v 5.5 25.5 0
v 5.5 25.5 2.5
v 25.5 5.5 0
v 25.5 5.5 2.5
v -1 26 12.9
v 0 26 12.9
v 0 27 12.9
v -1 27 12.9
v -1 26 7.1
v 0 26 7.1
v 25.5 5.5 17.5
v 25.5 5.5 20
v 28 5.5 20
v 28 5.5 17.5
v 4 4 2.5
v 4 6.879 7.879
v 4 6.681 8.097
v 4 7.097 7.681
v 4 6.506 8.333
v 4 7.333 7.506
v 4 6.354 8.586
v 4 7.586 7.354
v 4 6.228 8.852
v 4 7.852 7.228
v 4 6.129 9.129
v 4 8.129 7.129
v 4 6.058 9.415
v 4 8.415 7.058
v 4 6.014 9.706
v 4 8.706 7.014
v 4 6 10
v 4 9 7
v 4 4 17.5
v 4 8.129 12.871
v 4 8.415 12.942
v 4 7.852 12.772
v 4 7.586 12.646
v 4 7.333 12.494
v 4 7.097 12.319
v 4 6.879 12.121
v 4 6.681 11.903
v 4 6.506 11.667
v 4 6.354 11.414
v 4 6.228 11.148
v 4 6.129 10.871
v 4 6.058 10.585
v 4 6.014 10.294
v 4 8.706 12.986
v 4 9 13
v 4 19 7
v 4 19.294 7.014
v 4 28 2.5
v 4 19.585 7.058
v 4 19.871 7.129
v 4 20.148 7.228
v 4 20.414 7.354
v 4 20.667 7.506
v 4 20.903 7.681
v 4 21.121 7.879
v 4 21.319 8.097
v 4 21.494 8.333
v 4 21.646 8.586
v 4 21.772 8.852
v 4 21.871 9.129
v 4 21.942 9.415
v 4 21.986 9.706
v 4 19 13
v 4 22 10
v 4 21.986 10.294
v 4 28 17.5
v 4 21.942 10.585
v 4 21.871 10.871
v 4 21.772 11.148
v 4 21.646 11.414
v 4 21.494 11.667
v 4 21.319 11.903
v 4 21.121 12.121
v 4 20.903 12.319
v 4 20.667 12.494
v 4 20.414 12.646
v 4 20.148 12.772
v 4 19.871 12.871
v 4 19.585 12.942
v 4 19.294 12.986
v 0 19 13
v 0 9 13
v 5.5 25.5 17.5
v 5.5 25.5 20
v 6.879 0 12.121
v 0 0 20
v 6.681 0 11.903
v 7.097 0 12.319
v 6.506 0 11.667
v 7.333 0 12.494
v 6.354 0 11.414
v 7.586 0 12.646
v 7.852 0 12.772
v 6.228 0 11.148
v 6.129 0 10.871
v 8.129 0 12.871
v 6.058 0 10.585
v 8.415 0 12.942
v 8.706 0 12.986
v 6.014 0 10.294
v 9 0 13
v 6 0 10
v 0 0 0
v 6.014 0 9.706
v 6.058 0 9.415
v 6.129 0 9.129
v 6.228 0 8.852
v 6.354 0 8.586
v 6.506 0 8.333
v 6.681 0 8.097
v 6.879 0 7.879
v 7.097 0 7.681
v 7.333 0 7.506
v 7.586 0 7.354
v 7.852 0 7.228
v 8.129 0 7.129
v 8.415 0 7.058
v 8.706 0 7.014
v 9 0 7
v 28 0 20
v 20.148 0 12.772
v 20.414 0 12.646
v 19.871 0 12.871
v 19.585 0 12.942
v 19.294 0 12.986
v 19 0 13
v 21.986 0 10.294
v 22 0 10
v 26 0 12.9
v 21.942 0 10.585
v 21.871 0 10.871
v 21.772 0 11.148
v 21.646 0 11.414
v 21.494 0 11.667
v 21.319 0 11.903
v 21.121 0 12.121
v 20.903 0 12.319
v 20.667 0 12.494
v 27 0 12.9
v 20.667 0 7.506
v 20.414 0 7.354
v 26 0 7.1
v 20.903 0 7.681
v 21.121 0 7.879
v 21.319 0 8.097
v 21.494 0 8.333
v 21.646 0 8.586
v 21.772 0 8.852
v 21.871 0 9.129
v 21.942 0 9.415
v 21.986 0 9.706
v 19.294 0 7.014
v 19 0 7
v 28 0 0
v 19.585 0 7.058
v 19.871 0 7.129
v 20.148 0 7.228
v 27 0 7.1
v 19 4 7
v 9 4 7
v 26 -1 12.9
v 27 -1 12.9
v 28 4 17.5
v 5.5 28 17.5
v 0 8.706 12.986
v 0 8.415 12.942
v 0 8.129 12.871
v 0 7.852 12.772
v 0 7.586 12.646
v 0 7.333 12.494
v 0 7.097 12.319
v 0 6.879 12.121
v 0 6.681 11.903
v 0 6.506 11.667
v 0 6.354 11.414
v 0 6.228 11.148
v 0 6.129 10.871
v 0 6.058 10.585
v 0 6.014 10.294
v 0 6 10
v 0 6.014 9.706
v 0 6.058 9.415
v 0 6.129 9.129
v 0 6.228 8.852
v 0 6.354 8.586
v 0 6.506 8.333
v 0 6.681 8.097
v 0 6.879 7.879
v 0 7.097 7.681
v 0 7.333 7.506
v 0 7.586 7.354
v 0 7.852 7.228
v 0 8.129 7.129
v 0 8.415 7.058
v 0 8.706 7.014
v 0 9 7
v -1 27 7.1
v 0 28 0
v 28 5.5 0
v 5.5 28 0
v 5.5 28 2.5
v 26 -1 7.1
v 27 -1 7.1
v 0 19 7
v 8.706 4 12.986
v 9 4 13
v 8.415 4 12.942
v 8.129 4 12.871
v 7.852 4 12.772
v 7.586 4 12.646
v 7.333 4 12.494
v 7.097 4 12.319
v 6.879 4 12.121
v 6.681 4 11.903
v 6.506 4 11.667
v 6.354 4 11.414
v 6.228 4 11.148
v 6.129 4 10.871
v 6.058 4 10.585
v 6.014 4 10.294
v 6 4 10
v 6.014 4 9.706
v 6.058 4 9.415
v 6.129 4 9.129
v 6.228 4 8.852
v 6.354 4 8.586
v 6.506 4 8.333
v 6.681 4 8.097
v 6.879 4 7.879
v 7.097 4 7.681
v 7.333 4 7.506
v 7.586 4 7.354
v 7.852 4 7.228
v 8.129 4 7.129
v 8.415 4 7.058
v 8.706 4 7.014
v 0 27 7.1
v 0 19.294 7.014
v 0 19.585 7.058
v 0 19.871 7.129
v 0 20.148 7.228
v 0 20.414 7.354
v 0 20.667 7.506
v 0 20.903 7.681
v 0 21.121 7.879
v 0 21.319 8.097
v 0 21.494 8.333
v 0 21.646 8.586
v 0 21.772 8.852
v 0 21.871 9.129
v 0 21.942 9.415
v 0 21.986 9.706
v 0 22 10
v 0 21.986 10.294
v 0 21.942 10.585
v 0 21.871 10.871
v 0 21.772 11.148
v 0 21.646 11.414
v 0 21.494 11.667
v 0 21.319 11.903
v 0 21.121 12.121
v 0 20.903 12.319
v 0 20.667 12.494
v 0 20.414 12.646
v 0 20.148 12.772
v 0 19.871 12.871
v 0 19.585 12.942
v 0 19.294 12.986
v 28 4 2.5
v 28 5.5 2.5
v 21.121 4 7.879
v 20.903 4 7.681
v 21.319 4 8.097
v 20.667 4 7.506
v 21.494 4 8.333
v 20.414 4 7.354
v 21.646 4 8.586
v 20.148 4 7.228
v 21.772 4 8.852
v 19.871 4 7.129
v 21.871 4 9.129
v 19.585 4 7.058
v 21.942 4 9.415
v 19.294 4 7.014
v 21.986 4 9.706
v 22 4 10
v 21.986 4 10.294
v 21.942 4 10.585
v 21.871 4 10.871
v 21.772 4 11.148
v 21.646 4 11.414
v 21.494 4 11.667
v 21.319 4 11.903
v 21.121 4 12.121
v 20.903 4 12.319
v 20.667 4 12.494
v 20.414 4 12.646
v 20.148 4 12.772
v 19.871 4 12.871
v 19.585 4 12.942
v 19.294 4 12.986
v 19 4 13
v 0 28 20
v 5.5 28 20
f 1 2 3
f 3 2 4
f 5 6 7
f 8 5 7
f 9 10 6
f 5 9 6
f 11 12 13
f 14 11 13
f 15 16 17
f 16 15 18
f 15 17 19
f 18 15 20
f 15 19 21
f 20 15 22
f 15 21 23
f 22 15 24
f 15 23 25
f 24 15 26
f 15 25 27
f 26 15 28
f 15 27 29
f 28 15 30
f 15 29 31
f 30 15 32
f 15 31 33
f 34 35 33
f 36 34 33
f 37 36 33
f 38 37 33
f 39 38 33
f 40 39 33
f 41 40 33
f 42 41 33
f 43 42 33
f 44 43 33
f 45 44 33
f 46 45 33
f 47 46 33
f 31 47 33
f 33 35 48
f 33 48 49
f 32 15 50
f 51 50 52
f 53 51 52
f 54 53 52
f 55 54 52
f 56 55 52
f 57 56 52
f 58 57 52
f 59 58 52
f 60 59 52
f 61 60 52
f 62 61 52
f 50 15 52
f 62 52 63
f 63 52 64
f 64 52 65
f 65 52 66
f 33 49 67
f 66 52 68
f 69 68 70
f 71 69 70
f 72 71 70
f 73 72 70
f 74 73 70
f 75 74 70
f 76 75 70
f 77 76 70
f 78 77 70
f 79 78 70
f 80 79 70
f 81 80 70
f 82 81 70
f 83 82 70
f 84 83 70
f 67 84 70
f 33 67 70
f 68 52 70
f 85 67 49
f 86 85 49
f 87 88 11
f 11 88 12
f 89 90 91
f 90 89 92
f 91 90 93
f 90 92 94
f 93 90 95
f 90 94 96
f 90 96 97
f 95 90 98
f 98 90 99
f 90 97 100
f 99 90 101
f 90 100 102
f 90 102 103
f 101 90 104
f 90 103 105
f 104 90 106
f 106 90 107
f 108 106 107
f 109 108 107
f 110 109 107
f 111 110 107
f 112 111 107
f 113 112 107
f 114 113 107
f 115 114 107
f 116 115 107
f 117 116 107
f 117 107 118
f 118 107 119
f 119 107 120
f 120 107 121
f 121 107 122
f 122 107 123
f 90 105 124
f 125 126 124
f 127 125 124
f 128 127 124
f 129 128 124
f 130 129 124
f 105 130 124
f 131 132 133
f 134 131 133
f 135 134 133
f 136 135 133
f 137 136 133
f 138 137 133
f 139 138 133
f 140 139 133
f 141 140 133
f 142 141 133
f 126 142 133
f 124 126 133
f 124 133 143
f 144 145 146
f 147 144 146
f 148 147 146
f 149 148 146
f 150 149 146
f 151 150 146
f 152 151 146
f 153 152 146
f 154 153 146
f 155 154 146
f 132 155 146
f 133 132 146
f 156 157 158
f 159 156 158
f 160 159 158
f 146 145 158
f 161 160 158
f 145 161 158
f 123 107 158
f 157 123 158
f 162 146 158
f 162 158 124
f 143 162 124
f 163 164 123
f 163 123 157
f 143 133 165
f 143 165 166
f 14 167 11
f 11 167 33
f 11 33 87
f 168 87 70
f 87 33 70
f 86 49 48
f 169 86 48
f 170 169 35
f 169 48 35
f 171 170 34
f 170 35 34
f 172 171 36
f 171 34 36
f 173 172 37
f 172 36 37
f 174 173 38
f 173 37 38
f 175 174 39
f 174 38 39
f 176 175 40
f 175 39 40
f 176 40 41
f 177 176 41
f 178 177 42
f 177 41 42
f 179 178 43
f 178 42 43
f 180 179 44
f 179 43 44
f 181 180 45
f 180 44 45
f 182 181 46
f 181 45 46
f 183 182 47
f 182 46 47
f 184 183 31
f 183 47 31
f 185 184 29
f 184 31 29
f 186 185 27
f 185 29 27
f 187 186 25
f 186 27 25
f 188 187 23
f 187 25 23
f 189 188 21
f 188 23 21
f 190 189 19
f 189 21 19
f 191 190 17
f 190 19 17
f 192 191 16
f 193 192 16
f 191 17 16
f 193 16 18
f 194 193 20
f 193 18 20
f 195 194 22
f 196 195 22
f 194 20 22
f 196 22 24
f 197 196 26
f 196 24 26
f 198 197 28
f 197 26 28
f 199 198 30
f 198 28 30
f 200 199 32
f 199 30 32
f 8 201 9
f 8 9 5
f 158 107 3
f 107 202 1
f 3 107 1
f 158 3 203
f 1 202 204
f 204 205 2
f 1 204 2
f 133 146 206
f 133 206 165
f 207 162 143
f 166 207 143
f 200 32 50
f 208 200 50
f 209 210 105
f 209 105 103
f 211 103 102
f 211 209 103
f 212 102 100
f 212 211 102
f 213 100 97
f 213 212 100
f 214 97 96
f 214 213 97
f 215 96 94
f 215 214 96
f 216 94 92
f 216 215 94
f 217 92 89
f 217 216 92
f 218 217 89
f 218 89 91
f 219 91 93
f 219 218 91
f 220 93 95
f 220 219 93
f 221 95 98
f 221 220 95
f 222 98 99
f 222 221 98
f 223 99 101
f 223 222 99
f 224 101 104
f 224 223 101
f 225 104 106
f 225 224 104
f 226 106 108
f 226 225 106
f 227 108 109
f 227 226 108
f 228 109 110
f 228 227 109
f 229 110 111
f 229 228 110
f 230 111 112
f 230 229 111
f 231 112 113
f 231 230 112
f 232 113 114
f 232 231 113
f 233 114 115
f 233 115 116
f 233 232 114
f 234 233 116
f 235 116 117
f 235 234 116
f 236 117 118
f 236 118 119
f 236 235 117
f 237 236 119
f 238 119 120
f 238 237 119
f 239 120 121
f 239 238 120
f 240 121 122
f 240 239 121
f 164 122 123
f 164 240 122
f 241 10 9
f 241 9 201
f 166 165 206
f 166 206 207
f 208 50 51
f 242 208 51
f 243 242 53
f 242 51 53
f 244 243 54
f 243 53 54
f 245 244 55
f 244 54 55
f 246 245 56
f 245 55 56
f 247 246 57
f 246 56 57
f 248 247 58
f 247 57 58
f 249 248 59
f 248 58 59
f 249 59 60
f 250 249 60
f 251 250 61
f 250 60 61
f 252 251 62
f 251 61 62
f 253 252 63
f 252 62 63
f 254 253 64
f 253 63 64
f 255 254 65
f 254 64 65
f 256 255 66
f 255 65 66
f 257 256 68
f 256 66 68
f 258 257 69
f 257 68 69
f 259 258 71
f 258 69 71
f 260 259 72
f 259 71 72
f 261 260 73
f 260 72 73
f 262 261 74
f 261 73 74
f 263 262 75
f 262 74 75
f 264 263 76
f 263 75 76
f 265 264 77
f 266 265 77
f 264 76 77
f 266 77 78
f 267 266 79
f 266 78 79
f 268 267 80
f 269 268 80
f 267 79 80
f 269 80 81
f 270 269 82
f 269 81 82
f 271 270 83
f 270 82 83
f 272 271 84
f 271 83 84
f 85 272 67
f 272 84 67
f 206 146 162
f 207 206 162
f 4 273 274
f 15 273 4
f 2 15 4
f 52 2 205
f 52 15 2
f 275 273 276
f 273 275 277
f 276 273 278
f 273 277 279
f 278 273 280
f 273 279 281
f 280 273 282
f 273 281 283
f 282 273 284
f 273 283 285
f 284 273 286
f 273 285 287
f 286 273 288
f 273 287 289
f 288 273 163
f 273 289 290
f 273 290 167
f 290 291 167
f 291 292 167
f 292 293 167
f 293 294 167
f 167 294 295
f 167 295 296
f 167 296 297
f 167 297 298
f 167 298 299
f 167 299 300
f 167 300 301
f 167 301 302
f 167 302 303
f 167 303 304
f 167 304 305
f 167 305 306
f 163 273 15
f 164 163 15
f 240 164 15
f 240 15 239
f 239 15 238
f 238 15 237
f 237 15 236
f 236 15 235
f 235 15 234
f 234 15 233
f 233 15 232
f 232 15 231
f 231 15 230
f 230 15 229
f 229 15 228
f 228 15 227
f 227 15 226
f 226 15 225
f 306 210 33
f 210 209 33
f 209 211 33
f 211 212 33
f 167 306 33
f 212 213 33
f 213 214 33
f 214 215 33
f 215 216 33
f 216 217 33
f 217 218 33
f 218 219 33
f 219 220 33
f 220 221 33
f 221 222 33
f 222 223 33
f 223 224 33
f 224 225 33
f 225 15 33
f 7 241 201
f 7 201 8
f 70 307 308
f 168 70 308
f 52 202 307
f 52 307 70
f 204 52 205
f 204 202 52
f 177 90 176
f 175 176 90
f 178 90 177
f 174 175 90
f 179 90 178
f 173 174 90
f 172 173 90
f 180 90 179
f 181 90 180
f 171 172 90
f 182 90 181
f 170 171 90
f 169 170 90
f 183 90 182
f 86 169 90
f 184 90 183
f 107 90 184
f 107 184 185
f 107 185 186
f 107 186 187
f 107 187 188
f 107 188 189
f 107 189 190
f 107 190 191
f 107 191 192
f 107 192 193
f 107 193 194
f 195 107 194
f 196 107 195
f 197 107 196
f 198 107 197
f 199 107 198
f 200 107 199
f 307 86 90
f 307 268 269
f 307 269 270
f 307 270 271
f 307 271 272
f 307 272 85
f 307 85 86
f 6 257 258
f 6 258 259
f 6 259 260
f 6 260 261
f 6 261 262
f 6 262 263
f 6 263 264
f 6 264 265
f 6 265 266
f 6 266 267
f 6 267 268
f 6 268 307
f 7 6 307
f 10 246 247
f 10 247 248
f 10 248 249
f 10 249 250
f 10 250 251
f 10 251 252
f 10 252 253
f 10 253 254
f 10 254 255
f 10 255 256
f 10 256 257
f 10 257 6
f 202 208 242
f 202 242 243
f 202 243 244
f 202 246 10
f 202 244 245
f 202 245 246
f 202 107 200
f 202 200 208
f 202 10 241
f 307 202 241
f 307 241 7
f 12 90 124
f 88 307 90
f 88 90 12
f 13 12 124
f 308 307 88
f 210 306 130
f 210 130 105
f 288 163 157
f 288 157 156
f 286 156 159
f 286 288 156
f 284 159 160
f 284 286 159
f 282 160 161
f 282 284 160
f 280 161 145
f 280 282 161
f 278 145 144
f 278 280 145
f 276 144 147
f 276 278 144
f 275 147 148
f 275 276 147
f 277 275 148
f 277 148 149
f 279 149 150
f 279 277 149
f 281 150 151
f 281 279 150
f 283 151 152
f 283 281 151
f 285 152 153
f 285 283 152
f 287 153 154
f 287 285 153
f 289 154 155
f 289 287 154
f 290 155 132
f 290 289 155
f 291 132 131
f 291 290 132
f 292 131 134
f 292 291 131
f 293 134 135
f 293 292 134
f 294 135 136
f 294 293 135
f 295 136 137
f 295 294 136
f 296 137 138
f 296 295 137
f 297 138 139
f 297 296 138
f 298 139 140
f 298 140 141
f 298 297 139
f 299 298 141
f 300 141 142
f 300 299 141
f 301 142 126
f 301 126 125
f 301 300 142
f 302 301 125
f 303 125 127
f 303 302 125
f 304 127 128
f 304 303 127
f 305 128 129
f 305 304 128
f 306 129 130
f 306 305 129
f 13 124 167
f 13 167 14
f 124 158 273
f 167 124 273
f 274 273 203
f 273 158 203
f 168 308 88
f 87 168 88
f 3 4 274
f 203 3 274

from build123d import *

# Parameters (mm, degrees)
SKETCH1_W           = 28
SKETCH1_H           = 28
BOSS_EXTRUDE1_DEPTH = 20
CUT_EXTRUDE1_DEPTH  = 45.362146026
CUT_EXTRUDE2_REACH  = 43.952
SKETCH3_W           = 15
SKETCH3_H           = 26.880949604
CUT_EXTRUDE3_DEPTH  = 4
CUT_EXTRUDE4_DEPTH  = 4
SKETCH6_W           = 5.8
SKETCH6_H           = 1
BOSS_EXTRUDE2_DEPTH = 1
SKETCH7_W           = 1
SKETCH7_H           = 5.8
BOSS_EXTRUDE3_DEPTH = 1


with BuildPart() as part:
    # Sketch1 → Boss-Extrude1 (new body)
    with BuildSketch(Plane.XY):
        with Locations((14, 14)):
            Rectangle(SKETCH1_W, SKETCH1_H)
    extrude(amount=BOSS_EXTRUDE1_DEPTH)

    # Sketch2 → Cut-Extrude1 (cut, through all)
    with BuildSketch(Plane.XY.offset(20)):
        Polygon((5.5, 29.426142622), (5.5, 25.5), (25.5, 5.5), (30.244346823, 5.5), (30.244346823, 29.426142622), align=None)
    extrude(amount=-CUT_EXTRUDE1_DEPTH, mode=Mode.SUBTRACT)

    # Cut-Extrude2: up to this face of the body (flat: up to its plane)
    cut_extrude2_end = Plane(part.part.faces().sort_by_distance((28, 2.75, 10))[0])
    # Sketch3 → Cut-Extrude2 (cut, up to the picked face)
    with BuildSketch(Plane.ZY.offset(-4), mode=Mode.PRIVATE) as cut_extrude2_sk1:
        with Locations((10, 17.440474802)):
            Rectangle(SKETCH3_W, SKETCH3_H)
    cut_extrude2_tool1 = split(extrude(cut_extrude2_sk1.sketch, amount=-CUT_EXTRUDE2_REACH, mode=Mode.PRIVATE), bisect_by=cut_extrude2_end, keep=Keep.BOTH, mode=Mode.PRIVATE)
    add(cut_extrude2_tool1.solids().sort_by(Axis((4, 17.440475, 10), (1, 0, 0)))[0], mode=Mode.SUBTRACT)

    # Sketch4 → Cut-Extrude3 (cut)
    with BuildSketch(Plane(origin=(4, 0, 0), x_dir=(0, 0, -1), z_dir=(1, 0, 0))):
        with BuildLine():
            Line((-13, 19), (-13, 9))
            ThreePointArc((-13, 9), (-10, 6), (-7, 9))
            Line((-7, 9), (-7, 19))
            ThreePointArc((-7, 19), (-10, 22), (-13, 19))
        make_face()
    extrude(amount=-CUT_EXTRUDE3_DEPTH, mode=Mode.SUBTRACT)

    # Sketch5 → Cut-Extrude4 (cut)
    with BuildSketch(Plane(origin=(0, 4, 0), x_dir=(1, 0, 0), z_dir=(0, 1, 0))):
        with BuildLine():
            Line((19, -13), (9, -13))
            ThreePointArc((9, -13), (6, -10), (9, -7))
            Line((9, -7), (19, -7))
            ThreePointArc((19, -7), (22, -10), (19, -13))
        make_face()
    extrude(amount=-CUT_EXTRUDE4_DEPTH, mode=Mode.SUBTRACT)

    # Sketch6 → Boss-Extrude2 (add)
    with BuildSketch(Plane.ZY):
        with Locations((10, 26.5)):
            Rectangle(SKETCH6_W, SKETCH6_H)
    extrude(amount=BOSS_EXTRUDE2_DEPTH)

    # Sketch7 → Boss-Extrude3 (add)
    with BuildSketch(Plane.XZ):
        with Locations((26.5, 10)):
            Rectangle(SKETCH7_W, SKETCH7_H)
    extrude(amount=BOSS_EXTRUDE3_DEPTH)


solid = part.part
